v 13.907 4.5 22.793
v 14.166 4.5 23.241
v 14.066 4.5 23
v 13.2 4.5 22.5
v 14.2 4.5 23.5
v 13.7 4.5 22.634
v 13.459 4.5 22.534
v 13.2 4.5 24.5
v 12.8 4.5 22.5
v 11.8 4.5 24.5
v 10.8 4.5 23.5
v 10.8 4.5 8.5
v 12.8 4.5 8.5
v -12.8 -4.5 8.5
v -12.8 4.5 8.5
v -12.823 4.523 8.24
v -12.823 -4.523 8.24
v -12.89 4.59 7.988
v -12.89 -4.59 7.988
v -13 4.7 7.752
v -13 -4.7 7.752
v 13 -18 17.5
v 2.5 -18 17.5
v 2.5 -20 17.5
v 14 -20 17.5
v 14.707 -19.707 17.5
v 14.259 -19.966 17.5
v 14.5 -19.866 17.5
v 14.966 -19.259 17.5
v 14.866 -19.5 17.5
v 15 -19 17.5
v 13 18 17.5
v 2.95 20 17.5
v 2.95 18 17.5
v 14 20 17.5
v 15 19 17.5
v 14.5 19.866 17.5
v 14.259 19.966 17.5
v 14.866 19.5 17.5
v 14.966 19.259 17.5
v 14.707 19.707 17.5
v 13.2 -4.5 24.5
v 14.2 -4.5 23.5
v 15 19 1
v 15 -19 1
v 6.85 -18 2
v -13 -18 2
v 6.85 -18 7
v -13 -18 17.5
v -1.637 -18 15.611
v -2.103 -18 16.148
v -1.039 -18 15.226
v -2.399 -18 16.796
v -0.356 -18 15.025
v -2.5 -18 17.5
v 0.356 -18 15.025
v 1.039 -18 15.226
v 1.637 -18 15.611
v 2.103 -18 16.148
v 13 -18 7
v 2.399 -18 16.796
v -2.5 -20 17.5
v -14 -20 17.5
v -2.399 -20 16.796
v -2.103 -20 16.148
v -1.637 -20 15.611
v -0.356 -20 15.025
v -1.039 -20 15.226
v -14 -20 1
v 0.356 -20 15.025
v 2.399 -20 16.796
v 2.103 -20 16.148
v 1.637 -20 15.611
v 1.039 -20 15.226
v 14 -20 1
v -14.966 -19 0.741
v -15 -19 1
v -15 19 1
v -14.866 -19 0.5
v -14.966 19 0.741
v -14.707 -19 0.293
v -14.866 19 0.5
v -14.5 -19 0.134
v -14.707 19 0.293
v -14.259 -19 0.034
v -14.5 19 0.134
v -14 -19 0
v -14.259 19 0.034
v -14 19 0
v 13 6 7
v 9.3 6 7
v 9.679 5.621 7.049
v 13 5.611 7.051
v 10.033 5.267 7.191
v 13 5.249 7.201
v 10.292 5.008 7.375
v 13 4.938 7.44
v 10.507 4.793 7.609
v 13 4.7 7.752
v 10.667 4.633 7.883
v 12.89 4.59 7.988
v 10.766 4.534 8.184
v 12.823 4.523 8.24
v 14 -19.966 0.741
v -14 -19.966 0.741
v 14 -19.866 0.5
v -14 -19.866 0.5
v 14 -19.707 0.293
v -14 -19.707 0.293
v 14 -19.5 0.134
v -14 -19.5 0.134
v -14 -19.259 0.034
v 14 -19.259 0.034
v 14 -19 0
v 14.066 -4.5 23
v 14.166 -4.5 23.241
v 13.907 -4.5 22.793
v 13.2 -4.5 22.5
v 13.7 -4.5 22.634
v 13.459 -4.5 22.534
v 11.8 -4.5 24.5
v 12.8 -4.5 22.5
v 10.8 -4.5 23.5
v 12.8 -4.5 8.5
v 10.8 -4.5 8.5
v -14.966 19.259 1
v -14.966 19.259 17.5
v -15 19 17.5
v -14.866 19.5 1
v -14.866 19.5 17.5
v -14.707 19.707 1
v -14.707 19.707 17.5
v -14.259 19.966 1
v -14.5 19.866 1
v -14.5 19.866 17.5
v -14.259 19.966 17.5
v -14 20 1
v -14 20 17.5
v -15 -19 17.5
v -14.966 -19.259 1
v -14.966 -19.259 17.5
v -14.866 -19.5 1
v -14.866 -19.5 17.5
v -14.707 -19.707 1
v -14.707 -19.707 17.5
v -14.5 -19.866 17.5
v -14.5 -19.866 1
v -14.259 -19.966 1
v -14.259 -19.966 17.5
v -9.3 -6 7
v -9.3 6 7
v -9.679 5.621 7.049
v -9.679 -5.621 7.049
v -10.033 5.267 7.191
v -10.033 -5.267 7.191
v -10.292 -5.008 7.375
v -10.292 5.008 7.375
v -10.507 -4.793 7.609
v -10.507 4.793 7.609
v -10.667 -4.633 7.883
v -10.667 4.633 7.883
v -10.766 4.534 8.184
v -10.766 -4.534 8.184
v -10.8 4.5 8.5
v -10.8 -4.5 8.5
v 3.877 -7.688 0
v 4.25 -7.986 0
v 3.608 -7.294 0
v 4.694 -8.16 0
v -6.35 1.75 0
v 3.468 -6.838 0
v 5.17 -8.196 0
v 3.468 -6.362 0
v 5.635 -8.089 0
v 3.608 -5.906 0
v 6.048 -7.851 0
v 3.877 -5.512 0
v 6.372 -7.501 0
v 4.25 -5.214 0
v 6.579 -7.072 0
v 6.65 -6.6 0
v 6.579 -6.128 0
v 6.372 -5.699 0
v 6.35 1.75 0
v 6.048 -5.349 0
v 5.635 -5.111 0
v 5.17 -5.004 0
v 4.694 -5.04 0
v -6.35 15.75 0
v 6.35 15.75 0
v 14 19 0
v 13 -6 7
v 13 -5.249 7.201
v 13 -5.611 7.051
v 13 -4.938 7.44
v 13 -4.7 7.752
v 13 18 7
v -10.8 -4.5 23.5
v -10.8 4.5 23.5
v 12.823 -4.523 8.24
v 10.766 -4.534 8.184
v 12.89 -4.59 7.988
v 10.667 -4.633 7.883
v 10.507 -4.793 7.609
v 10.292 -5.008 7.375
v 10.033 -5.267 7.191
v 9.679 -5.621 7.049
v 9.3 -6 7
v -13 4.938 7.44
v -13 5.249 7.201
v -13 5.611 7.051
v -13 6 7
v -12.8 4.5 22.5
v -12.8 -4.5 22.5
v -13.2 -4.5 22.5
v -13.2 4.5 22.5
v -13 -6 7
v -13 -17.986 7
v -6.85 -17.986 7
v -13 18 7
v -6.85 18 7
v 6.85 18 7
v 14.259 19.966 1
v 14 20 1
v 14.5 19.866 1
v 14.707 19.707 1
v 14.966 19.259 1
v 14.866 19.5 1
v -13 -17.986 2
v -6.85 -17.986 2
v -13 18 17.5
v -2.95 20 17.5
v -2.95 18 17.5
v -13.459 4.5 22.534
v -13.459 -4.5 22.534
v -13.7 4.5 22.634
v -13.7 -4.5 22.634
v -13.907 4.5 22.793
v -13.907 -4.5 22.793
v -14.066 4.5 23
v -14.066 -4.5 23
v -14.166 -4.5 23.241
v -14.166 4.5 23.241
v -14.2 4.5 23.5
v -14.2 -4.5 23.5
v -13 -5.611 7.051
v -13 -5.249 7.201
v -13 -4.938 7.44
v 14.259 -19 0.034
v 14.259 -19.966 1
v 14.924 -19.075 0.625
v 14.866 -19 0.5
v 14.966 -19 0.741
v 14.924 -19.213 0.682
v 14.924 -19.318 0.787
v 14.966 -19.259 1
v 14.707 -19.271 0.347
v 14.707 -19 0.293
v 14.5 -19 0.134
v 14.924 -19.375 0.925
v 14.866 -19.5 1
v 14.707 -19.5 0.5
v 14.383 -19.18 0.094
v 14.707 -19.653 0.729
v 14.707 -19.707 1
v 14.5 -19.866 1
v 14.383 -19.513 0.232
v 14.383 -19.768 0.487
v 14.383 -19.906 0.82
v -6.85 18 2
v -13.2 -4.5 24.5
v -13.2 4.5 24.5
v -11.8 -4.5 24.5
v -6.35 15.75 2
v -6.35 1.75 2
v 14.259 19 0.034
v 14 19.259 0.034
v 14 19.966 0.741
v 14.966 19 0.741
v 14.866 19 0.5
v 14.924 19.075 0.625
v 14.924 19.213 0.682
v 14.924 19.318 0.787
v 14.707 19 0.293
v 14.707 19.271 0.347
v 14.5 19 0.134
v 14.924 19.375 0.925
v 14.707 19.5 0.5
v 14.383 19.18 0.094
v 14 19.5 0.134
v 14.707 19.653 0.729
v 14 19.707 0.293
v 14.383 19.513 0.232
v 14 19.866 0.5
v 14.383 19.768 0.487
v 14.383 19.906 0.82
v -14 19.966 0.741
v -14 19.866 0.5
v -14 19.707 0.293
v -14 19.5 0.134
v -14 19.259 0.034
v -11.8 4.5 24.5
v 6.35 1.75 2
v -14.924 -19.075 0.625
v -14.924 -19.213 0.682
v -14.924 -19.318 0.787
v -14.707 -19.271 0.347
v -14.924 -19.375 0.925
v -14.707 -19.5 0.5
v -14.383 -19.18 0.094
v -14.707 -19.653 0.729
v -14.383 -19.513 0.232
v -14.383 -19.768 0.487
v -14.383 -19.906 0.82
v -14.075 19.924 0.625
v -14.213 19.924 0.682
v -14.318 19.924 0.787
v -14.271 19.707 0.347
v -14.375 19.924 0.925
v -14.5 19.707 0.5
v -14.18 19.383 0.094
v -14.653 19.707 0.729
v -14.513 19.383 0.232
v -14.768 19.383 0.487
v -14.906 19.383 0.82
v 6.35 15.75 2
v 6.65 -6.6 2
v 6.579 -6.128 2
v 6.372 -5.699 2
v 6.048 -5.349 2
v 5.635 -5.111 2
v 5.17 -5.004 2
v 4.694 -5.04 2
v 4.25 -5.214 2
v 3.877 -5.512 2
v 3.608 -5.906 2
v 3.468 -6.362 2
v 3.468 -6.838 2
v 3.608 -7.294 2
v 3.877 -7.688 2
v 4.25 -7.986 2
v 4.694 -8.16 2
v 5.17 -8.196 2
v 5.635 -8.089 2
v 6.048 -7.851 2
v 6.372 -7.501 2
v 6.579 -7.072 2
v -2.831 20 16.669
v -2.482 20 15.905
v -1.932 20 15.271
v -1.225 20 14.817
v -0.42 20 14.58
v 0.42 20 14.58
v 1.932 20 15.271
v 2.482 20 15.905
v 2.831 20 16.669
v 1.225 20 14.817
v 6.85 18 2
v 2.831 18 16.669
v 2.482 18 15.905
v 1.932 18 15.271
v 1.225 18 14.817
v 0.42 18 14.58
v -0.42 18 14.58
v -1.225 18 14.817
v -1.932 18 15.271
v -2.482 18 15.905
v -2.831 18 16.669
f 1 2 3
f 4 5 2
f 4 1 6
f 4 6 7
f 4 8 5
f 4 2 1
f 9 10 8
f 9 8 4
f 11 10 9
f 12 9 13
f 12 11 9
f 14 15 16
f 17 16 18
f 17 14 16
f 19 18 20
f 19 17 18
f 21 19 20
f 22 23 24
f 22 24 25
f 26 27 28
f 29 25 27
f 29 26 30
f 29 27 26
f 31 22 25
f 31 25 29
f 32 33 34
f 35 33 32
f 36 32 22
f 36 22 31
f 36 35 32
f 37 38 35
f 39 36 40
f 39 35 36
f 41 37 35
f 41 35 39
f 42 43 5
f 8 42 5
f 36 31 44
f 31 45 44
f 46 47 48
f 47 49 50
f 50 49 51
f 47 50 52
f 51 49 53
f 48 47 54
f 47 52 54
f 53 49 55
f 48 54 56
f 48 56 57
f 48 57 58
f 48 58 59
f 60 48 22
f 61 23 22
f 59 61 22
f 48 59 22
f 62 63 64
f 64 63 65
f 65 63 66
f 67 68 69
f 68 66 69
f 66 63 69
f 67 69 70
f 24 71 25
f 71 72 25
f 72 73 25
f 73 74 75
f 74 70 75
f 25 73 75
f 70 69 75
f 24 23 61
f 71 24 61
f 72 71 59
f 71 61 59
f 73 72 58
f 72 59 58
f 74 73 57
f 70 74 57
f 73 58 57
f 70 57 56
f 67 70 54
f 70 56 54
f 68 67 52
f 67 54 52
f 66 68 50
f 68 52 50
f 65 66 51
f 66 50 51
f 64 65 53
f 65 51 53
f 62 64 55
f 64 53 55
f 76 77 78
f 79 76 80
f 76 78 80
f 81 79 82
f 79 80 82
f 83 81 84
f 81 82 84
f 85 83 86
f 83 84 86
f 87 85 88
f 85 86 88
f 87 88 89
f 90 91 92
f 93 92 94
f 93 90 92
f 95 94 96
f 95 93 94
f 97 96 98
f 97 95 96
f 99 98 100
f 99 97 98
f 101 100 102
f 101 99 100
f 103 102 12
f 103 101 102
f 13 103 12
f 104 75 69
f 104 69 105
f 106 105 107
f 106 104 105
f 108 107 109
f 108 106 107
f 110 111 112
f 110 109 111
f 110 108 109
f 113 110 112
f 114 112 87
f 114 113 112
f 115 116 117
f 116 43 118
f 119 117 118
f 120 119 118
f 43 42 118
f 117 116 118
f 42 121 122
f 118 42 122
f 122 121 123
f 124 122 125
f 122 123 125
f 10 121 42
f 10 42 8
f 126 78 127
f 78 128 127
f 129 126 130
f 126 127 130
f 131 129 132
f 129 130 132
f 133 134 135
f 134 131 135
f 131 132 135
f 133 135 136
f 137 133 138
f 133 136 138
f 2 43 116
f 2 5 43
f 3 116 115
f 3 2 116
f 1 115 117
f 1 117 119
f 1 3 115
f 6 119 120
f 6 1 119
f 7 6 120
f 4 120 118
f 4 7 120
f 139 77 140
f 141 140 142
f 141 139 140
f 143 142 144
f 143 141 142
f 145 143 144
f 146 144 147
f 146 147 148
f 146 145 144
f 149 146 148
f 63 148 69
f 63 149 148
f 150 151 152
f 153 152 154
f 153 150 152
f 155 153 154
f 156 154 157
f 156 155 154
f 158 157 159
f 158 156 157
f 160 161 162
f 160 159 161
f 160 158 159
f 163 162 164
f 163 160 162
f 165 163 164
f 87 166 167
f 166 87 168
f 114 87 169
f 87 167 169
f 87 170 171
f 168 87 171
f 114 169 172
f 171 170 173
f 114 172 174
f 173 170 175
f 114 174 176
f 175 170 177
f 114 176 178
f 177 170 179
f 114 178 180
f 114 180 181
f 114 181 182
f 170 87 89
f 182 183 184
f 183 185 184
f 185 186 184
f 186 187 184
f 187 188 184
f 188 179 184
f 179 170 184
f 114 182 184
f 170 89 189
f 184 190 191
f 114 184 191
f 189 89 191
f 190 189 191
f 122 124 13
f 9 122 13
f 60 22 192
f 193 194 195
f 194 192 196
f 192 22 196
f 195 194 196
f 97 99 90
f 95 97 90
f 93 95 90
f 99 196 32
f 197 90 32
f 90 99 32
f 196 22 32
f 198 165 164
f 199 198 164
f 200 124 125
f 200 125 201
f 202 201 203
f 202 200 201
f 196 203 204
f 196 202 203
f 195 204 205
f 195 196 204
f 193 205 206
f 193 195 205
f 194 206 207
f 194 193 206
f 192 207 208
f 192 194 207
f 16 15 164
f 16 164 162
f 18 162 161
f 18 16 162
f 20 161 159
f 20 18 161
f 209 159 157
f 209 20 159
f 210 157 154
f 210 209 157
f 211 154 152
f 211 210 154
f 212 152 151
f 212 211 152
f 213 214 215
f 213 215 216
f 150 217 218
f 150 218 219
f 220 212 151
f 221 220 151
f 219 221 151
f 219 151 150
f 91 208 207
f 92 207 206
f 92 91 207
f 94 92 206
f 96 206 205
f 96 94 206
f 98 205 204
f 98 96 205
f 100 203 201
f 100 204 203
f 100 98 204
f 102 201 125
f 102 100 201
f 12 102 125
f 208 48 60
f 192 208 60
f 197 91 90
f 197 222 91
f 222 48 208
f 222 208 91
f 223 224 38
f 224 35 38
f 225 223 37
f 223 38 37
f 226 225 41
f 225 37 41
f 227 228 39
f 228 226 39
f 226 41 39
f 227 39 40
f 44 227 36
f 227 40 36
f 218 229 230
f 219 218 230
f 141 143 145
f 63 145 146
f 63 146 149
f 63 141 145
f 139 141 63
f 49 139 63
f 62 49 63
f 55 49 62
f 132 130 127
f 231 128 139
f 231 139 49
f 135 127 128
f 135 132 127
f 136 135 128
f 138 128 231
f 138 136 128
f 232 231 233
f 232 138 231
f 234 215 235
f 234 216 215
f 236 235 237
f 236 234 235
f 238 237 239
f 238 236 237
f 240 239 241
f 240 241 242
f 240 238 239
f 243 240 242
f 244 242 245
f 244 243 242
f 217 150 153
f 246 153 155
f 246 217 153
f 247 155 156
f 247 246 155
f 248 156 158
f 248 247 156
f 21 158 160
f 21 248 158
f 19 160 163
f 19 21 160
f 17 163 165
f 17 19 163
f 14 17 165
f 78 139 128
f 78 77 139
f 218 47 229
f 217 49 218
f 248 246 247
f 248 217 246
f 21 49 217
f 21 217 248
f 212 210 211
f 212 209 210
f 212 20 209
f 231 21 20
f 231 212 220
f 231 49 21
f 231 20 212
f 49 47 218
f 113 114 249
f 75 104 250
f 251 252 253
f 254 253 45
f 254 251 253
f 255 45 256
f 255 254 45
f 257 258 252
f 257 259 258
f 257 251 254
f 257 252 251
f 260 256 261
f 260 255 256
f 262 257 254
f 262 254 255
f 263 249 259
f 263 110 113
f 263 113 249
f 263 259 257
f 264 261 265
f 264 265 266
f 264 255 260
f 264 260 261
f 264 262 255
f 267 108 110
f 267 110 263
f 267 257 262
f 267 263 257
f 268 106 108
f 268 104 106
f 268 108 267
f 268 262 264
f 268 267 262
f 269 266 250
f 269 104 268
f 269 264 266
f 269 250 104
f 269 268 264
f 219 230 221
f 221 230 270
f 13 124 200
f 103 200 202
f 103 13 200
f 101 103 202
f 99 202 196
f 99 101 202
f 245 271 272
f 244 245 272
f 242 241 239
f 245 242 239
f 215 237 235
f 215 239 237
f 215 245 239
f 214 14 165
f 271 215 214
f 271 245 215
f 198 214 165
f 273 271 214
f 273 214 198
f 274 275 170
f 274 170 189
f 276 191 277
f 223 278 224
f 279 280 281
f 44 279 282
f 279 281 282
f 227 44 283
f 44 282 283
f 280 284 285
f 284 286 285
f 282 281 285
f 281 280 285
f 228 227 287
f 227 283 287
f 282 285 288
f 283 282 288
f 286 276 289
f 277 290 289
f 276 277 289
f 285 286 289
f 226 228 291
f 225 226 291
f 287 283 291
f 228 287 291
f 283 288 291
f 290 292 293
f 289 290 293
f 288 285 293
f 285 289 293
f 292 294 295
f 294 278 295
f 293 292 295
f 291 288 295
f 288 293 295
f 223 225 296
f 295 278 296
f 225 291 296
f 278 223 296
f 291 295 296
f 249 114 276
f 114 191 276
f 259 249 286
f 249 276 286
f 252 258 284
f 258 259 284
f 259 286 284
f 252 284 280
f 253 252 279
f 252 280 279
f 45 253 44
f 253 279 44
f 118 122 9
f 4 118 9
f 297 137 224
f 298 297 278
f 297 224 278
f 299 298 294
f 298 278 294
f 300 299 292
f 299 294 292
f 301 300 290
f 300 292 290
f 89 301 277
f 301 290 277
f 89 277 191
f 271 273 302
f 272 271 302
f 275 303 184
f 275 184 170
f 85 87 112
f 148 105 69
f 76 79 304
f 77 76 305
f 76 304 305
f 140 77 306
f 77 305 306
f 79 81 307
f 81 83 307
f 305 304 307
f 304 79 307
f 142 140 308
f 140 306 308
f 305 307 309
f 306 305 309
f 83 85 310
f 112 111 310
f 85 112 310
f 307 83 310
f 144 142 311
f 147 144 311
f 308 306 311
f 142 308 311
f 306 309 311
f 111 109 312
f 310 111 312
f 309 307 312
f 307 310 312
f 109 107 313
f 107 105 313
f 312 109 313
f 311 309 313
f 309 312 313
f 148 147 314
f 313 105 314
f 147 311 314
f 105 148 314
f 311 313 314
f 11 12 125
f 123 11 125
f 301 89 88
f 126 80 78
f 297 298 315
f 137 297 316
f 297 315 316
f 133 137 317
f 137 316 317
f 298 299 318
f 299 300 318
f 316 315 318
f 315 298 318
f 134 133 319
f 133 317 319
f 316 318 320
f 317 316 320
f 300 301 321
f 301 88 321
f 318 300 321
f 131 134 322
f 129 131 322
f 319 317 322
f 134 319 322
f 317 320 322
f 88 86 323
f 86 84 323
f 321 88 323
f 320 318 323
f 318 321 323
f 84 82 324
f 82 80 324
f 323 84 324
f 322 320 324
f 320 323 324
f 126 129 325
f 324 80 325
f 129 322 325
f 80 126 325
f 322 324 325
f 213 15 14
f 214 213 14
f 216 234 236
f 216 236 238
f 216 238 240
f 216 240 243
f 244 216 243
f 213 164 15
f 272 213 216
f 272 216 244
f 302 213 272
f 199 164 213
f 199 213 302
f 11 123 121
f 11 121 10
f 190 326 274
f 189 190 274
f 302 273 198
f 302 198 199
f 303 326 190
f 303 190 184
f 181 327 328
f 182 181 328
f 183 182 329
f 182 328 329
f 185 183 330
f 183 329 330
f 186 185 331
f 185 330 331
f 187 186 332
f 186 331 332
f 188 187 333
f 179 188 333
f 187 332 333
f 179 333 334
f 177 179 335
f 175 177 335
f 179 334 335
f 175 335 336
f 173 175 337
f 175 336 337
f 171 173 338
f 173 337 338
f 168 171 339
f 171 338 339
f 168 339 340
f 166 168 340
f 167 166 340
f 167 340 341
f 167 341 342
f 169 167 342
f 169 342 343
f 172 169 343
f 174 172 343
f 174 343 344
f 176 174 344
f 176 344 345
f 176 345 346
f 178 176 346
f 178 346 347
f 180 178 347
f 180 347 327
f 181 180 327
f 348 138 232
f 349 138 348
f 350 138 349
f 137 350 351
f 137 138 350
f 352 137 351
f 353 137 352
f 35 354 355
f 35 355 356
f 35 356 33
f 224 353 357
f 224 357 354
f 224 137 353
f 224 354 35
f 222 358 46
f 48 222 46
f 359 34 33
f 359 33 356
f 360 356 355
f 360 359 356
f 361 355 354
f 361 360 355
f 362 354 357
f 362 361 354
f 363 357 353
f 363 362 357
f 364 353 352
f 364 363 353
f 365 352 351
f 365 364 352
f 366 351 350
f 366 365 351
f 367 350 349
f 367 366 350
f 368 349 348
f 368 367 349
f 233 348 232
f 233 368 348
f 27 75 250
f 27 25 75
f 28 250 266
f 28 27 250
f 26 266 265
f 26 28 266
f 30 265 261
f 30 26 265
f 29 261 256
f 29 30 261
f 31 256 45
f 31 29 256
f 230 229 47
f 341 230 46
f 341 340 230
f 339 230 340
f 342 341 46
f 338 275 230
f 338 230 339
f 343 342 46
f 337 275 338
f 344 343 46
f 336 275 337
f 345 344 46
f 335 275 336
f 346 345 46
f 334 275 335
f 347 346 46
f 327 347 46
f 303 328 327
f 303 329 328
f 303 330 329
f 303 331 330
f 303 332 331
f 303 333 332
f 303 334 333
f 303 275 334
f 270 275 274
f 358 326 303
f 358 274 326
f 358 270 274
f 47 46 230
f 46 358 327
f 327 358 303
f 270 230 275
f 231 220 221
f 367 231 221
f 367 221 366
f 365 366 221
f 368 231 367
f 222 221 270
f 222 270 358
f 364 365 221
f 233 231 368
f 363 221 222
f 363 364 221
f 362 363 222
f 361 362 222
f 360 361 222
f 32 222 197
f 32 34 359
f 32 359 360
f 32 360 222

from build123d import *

# Parameters (mm, degrees)
SKETCH1_W           = 30
SKETCH1_H           = 40
BOSS_EXTRUDE1_DEPTH = 17.5
SKETCH2_W           = 26
SKETCH2_H           = 36
CUT_EXTRUDE1_DEPTH  = 15.5
SKETCH3_R           = 1.6
CUT_EXTRUDE2_DEPTH  = 30.41513216
BOSS_EXTRUDE2_DEPTH = 5
CUT_EXTRUDE3_DEPTH  = 45.443784717
CUT_EXTRUDE4_DEPTH  = 45.443784717
BOSS_EXTRUDE3_START = 0.2
SKETCH6_W           = 7
SKETCH6_H           = 9
SKETCH6_W_2         = 10.5
BOSS_EXTRUDE3_DEPTH = 2
FILLET2_R           = 1
BOSS_EXTRUDE7_START = 0.2
SKETCH7_W           = 17.5
SKETCH7_H           = 9
BOSS_EXTRUDE7_DEPTH = 2
SKETCH8_W           = 2
SKETCH8_H           = 9
BOSS_EXTRUDE8_DEPTH = 1.4
FILLET6_R           = 1.5
SKETCH9_W           = 2
SKETCH9_H           = 9
BOSS_EXTRUDE9_DEPTH = 1.4
CHAMFER1_SIZE       = 1
FILLET7_R           = 1


# Some blends are built 0.0001 mm under size
with BuildPart() as part:
    # Sketch1 → Boss-Extrude1 (new body)
    with BuildSketch(Plane.XY):
        Rectangle(SKETCH1_W, SKETCH1_H)
    extrude(amount=BOSS_EXTRUDE1_DEPTH)

    # Sketch2 → Cut-Extrude1 (cut)
    with BuildSketch(Plane.XY.offset(17.5)):
        Rectangle(SKETCH2_W, SKETCH2_H)
    extrude(amount=-CUT_EXTRUDE1_DEPTH, mode=Mode.SUBTRACT)

    # Sketch3 → Cut-Extrude2 (cut, through all)
    with BuildSketch(Plane.XY.offset(2)):
        Polygon((6.35, 1.75), (-6.35, 1.75), (-6.35, 15.75), (0, 15.75), (6.35, 15.75), align=None)
        with Locations((5.05, -6.6)):
            Circle(SKETCH3_R)
    extrude(amount=-CUT_EXTRUDE2_DEPTH, mode=Mode.SUBTRACT)

    # Sketch3<3> → Boss-Extrude2 (add)
    with BuildSketch(Plane.XY.offset(2)):
        Polygon((-6.85, -14), (-6.85, 18), (-13, 18), (-13, -17.985559901), (-6.85, -17.985559901), align=None)
        Polygon((13, 18), (6.85, 18), (6.85, -14), (6.85, -18), (13, -18), align=None)
    extrude(amount=BOSS_EXTRUDE2_DEPTH)

    # Sketch4 → Cut-Extrude3 (cut, through all)
    with BuildSketch(Plane.XZ.offset(-18)):
        with BuildLine():
            Line((-2.95, 17.5), (2.95, 17.5))
            ThreePointArc((2.95, 17.5), (0, 14.55), (-2.95, 17.5))
        make_face()
    extrude(amount=-CUT_EXTRUDE3_DEPTH, mode=Mode.SUBTRACT)

    # Sketch5 → Cut-Extrude4 (cut, through all)
    with BuildSketch(Plane(origin=(0, -18, 0), x_dir=(1, 0, 0), z_dir=(0, 1, 0))):
        with BuildLine():
            Line((-2.5, -17.5), (2.5, -17.5))
            ThreePointArc((2.5, -17.5), (0, -15), (-2.5, -17.5))
        make_face()
    extrude(amount=-CUT_EXTRUDE4_DEPTH, mode=Mode.SUBTRACT)

    # Sketch6 → Boss-Extrude3 (add)
    with BuildSketch(Plane.ZY.offset(-13).offset(BOSS_EXTRUDE3_START)):
        with Locations((21, 0)):
            Rectangle(SKETCH6_W, SKETCH6_H)
        with Locations((12.25, 0)):
            Rectangle(SKETCH6_W_2, SKETCH6_H)
    extrude(amount=BOSS_EXTRUDE3_DEPTH)

    # Fillet2
    fillet2_edges = [part.edges().sort_by_distance(p)[0] for p in [
        (0, -20, 0),
        (-15, 0, 0),
        (0, 20, 0),
        (15, 0, 0),
        (15, -20, 8.75),
        (-15, -20, 8.75),
        (-15, 20, 8.75),
        (15, 20, 8.75),
    ]]
    fillet(fillet2_edges, radius=FILLET2_R)

    # Sketch7 → Boss-Extrude7 (add)
    with BuildSketch(Plane(origin=(-13, 0, 0), x_dir=(0, 0, -1), z_dir=(1, 0, 0)).offset(BOSS_EXTRUDE7_START)):
        with Locations((-15.75, 0)):
            Rectangle(SKETCH7_W, SKETCH7_H)
    extrude(amount=BOSS_EXTRUDE7_DEPTH)

    # Sketch8 → Boss-Extrude8 (add)
    with BuildSketch(Plane.ZY.offset(12.8)):
        with Locations((23.5, 0)):
            Rectangle(SKETCH8_W, SKETCH8_H)
    extrude(amount=BOSS_EXTRUDE8_DEPTH)

    # Fillet6
    # the kernel refuses this fillet: 1.5 mm, written as the material it adds along each edge
    with BuildSketch(Plane(origin=(12.8, -4.5, 7), x_dir=(0, -1, 0), z_dir=(-1, 0, 0)), Plane(origin=(-12.8, 4.5, 7), x_dir=(0, 1, 0), z_dir=(1, 0, 0))) as fillet6_piece_1:
        with BuildLine():
            CenterArc((FILLET6_R, FILLET6_R), FILLET6_R, 180, 90)
            Line((0, FILLET6_R), (-FILLET6_R * 0.02, FILLET6_R))
            Line((-FILLET6_R * 0.02, FILLET6_R), (-FILLET6_R * 0.02, -FILLET6_R * 0.02))
            Line((-FILLET6_R * 0.02, -FILLET6_R * 0.02), (FILLET6_R, -FILLET6_R * 0.02))
            Line((FILLET6_R, -FILLET6_R * 0.02), (FILLET6_R, 0))
        make_face()
    extrude(amount=2)
    with BuildSketch(Plane(origin=(12.8, 4.5, 7), x_dir=(1, 0, 0), z_dir=(0, -1, 0)), Plane(origin=(-12.8, -4.5, 7), x_dir=(-1, 0, 0), z_dir=(0, 1, 0))) as fillet6_piece_2:
        with BuildLine():
            CenterArc((FILLET6_R, FILLET6_R), FILLET6_R, 180, 90)
            Line((0, FILLET6_R), (-FILLET6_R * 0.02, FILLET6_R))
            Line((-FILLET6_R * 0.02, FILLET6_R), (-FILLET6_R * 0.02, -FILLET6_R * 0.02))
            Line((-FILLET6_R * 0.02, -FILLET6_R * 0.02), (FILLET6_R, -FILLET6_R * 0.02))
            Line((FILLET6_R, -FILLET6_R * 0.02), (FILLET6_R, 0))
        make_face()
    extrude(amount=9)
    with BuildSketch(Plane(origin=(12.8, 4.5, 7), x_dir=(0, 1, 0), z_dir=(-1, 0, 0)), Plane(origin=(-12.8, -4.5, 7), x_dir=(0, -1, 0), z_dir=(1, 0, 0))) as fillet6_piece_3:
        with BuildLine():
            CenterArc((FILLET6_R, -FILLET6_R), FILLET6_R, 90, 90)
            Line((0, -FILLET6_R), (-FILLET6_R * 0.02, -FILLET6_R))
            Line((-FILLET6_R * 0.02, -FILLET6_R), (-FILLET6_R * 0.02, FILLET6_R * 0.02))
            Line((-FILLET6_R * 0.02, FILLET6_R * 0.02), (FILLET6_R, FILLET6_R * 0.02))
            Line((FILLET6_R, FILLET6_R * 0.02), (FILLET6_R, 0))
        make_face()
    extrude(amount=2)
    with BuildSketch(Plane(origin=(10.8, 4.5, 7), x_dir=(-1, 0, 0), z_dir=(0, -1, 0)), Plane(origin=(-10.8, -4.5, 7), x_dir=(1, 0, 0), z_dir=(0, 1, 0))) as fillet6_piece_4:
        with BuildLine():
            CenterArc((FILLET6_R, -FILLET6_R), FILLET6_R, 90, 90)
            Line((0, -FILLET6_R), (-FILLET6_R * 0.02, -FILLET6_R))
            Line((-FILLET6_R * 0.02, -FILLET6_R), (-FILLET6_R * 0.02, FILLET6_R * 0.02))
            Line((-FILLET6_R * 0.02, FILLET6_R * 0.02), (FILLET6_R, FILLET6_R * 0.02))
            Line((FILLET6_R, FILLET6_R * 0.02), (FILLET6_R, 0))
        make_face()
    extrude(amount=9)
    with BuildSketch(Plane(origin=(12.8, 4.5, 7), x_dir=(1, 0, 0), z_dir=(0, -1, 0))) as fillet6_piece_5a_section:
        with BuildLine():
            CenterArc((FILLET6_R, FILLET6_R), FILLET6_R, 180, 90)
            Line((0, FILLET6_R), (-FILLET6_R * 0.02, FILLET6_R))
            Line((-FILLET6_R * 0.02, FILLET6_R), (-FILLET6_R * 0.02, -FILLET6_R * 0.02))
            Line((-FILLET6_R * 0.02, -FILLET6_R * 0.02), (FILLET6_R, -FILLET6_R * 0.02))
            Line((FILLET6_R, -FILLET6_R * 0.02), (FILLET6_R, 0))
        make_face()
    fillet6_piece_5a = extrude(amount=12.75, mode=Mode.PRIVATE)
    fillet6_piece_5a = split(fillet6_piece_5a, bisect_by=Plane(origin=(13.139592671, -4.5, 7.339592671), z_dir=(0, -1, 0)), keep=Keep.TOP, mode=Mode.PRIVATE)
    with BuildSketch(Plane(origin=(16.55, -4.5, 7), x_dir=(0, -1, 0), z_dir=(-1, 0, 0))) as fillet6_piece_5b_section:
        with BuildLine():
            CenterArc((FILLET6_R, FILLET6_R), FILLET6_R, 180, 90)
            Line((0, FILLET6_R), (-FILLET6_R * 0.02, FILLET6_R))
            Line((-FILLET6_R * 0.02, FILLET6_R), (-FILLET6_R * 0.02, -FILLET6_R * 0.02))
            Line((-FILLET6_R * 0.02, -FILLET6_R * 0.02), (FILLET6_R, -FILLET6_R * 0.02))
            Line((FILLET6_R, -FILLET6_R * 0.02), (FILLET6_R, 0))
        make_face()
    fillet6_piece_5b = extrude(amount=5.75, mode=Mode.PRIVATE)
    fillet6_piece_5b = split(fillet6_piece_5b, bisect_by=Plane(origin=(12.8, -4.839592671, 7.339592671), z_dir=(1, 0, 0)), keep=Keep.TOP, mode=Mode.PRIVATE)
    fillet6_piece_5 = fillet6_piece_5a & fillet6_piece_5b
    add(fillet6_piece_5)
    with BuildSketch(Plane(origin=(10.8, 4.5, 7), x_dir=(-1, 0, 0), z_dir=(0, -1, 0))) as fillet6_piece_6a_section:
        with BuildLine():
            CenterArc((FILLET6_R, -FILLET6_R), FILLET6_R, 90, 90)
            Line((0, -FILLET6_R), (-FILLET6_R * 0.02, -FILLET6_R))
            Line((-FILLET6_R * 0.02, -FILLET6_R), (-FILLET6_R * 0.02, FILLET6_R * 0.02))
            Line((-FILLET6_R * 0.02, FILLET6_R * 0.02), (FILLET6_R, FILLET6_R * 0.02))
            Line((FILLET6_R, FILLET6_R * 0.02), (FILLET6_R, 0))
        make_face()
    fillet6_piece_6a = extrude(amount=12.75, mode=Mode.PRIVATE)
    fillet6_piece_6a = split(fillet6_piece_6a, bisect_by=Plane(origin=(10.460407329, -4.5, 7.339592671), z_dir=(0, -1, 0)), keep=Keep.TOP, mode=Mode.PRIVATE)
    with BuildSketch(Plane(origin=(12.8, -4.5, 7), x_dir=(0, -1, 0), z_dir=(-1, 0, 0))) as fillet6_piece_6b_section:
        with BuildLine():
            CenterArc((FILLET6_R, FILLET6_R), FILLET6_R, 180, 90)
            Line((0, FILLET6_R), (-FILLET6_R * 0.02, FILLET6_R))
            Line((-FILLET6_R * 0.02, FILLET6_R), (-FILLET6_R * 0.02, -FILLET6_R * 0.02))
            Line((-FILLET6_R * 0.02, -FILLET6_R * 0.02), (FILLET6_R, -FILLET6_R * 0.02))
            Line((FILLET6_R, -FILLET6_R * 0.02), (FILLET6_R, 0))
        make_face()
    fillet6_piece_6b = extrude(amount=5.75, mode=Mode.PRIVATE)
    fillet6_piece_6b = split(fillet6_piece_6b, bisect_by=Plane(origin=(10.8, -4.839592671, 7.339592671), z_dir=(-1, 0, 0)), keep=Keep.TOP, mode=Mode.PRIVATE)
    fillet6_piece_6 = fillet6_piece_6a & fillet6_piece_6b
    add(fillet6_piece_6)
    with BuildSketch(Plane(origin=(12.8, 8.25, 7), x_dir=(1, 0, 0), z_dir=(0, -1, 0))) as fillet6_piece_7a_section:
        with BuildLine():
            CenterArc((FILLET6_R, FILLET6_R), FILLET6_R, 180, 90)
            Line((0, FILLET6_R), (-FILLET6_R * 0.02, FILLET6_R))
            Line((-FILLET6_R * 0.02, FILLET6_R), (-FILLET6_R * 0.02, -FILLET6_R * 0.02))
            Line((-FILLET6_R * 0.02, -FILLET6_R * 0.02), (FILLET6_R, -FILLET6_R * 0.02))
            Line((FILLET6_R, -FILLET6_R * 0.02), (FILLET6_R, 0))
        make_face()
    fillet6_piece_7a = extrude(amount=12.75, mode=Mode.PRIVATE)
    fillet6_piece_7a = split(fillet6_piece_7a, bisect_by=Plane(origin=(13.139592671, 4.5, 7.339592671), z_dir=(0, 1, 0)), keep=Keep.TOP, mode=Mode.PRIVATE)
    with BuildSketch(Plane(origin=(16.55, 4.5, 7), x_dir=(0, 1, 0), z_dir=(-1, 0, 0))) as fillet6_piece_7b_section:
        with BuildLine():
            CenterArc((FILLET6_R, -FILLET6_R), FILLET6_R, 90, 90)
            Line((0, -FILLET6_R), (-FILLET6_R * 0.02, -FILLET6_R))
            Line((-FILLET6_R * 0.02, -FILLET6_R), (-FILLET6_R * 0.02, FILLET6_R * 0.02))
            Line((-FILLET6_R * 0.02, FILLET6_R * 0.02), (FILLET6_R, FILLET6_R * 0.02))
            Line((FILLET6_R, FILLET6_R * 0.02), (FILLET6_R, 0))
        make_face()
    fillet6_piece_7b = extrude(amount=5.75, mode=Mode.PRIVATE)
    fillet6_piece_7b = split(fillet6_piece_7b, bisect_by=Plane(origin=(12.8, 4.839592671, 7.339592671), z_dir=(1, 0, 0)), keep=Keep.TOP, mode=Mode.PRIVATE)
    fillet6_piece_7 = fillet6_piece_7a & fillet6_piece_7b
    add(fillet6_piece_7)
    with BuildSketch(Plane(origin=(12.8, 4.5, 7), x_dir=(0, 1, 0), z_dir=(-1, 0, 0))) as fillet6_piece_8a_section:
        with BuildLine():
            CenterArc((FILLET6_R, -FILLET6_R), FILLET6_R, 90, 90)
            Line((0, -FILLET6_R), (-FILLET6_R * 0.02, -FILLET6_R))
            Line((-FILLET6_R * 0.02, -FILLET6_R), (-FILLET6_R * 0.02, FILLET6_R * 0.02))
            Line((-FILLET6_R * 0.02, FILLET6_R * 0.02), (FILLET6_R, FILLET6_R * 0.02))
            Line((FILLET6_R, FILLET6_R * 0.02), (FILLET6_R, 0))
        make_face()
    fillet6_piece_8a = extrude(amount=5.75, mode=Mode.PRIVATE)
    fillet6_piece_8a = split(fillet6_piece_8a, bisect_by=Plane(origin=(10.8, 4.839592671, 7.339592671), z_dir=(-1, 0, 0)), keep=Keep.TOP, mode=Mode.PRIVATE)
    with BuildSketch(Plane(origin=(10.8, 8.25, 7), x_dir=(-1, 0, 0), z_dir=(0, -1, 0))) as fillet6_piece_8b_section:
        with BuildLine():
            CenterArc((FILLET6_R, -FILLET6_R), FILLET6_R, 90, 90)
            Line((0, -FILLET6_R), (-FILLET6_R * 0.02, -FILLET6_R))
            Line((-FILLET6_R * 0.02, -FILLET6_R), (-FILLET6_R * 0.02, FILLET6_R * 0.02))
            Line((-FILLET6_R * 0.02, FILLET6_R * 0.02), (FILLET6_R, FILLET6_R * 0.02))
            Line((FILLET6_R, FILLET6_R * 0.02), (FILLET6_R, 0))
        make_face()
    fillet6_piece_8b = extrude(amount=12.75, mode=Mode.PRIVATE)
    fillet6_piece_8b = split(fillet6_piece_8b, bisect_by=Plane(origin=(10.460407329, 4.5, 7.339592671), z_dir=(0, 1, 0)), keep=Keep.TOP, mode=Mode.PRIVATE)
    fillet6_piece_8 = fillet6_piece_8a & fillet6_piece_8b
    add(fillet6_piece_8)
    with BuildSketch(Plane(origin=(-16.55, 4.5, 7), x_dir=(0, 1, 0), z_dir=(1, 0, 0))) as fillet6_piece_9a_section:
        with BuildLine():
            CenterArc((FILLET6_R, FILLET6_R), FILLET6_R, 180, 90)
            Line((0, FILLET6_R), (-FILLET6_R * 0.02, FILLET6_R))
            Line((-FILLET6_R * 0.02, FILLET6_R), (-FILLET6_R * 0.02, -FILLET6_R * 0.02))
            Line((-FILLET6_R * 0.02, -FILLET6_R * 0.02), (FILLET6_R, -FILLET6_R * 0.02))
            Line((FILLET6_R, -FILLET6_R * 0.02), (FILLET6_R, 0))
        make_face()
    fillet6_piece_9a = extrude(amount=5.75, mode=Mode.PRIVATE)
    fillet6_piece_9a = split(fillet6_piece_9a, bisect_by=Plane(origin=(-12.8, 4.839592671, 7.339592671), z_dir=(-1, 0, 0)), keep=Keep.TOP, mode=Mode.PRIVATE)
    with BuildSketch(Plane(origin=(-12.8, -4.5, 7), x_dir=(-1, 0, 0), z_dir=(0, 1, 0))) as fillet6_piece_9b_section:
        with BuildLine():
            CenterArc((FILLET6_R, FILLET6_R), FILLET6_R, 180, 90)
            Line((0, FILLET6_R), (-FILLET6_R * 0.02, FILLET6_R))
            Line((-FILLET6_R * 0.02, FILLET6_R), (-FILLET6_R * 0.02, -FILLET6_R * 0.02))
            Line((-FILLET6_R * 0.02, -FILLET6_R * 0.02), (FILLET6_R, -FILLET6_R * 0.02))
            Line((FILLET6_R, -FILLET6_R * 0.02), (FILLET6_R, 0))
        make_face()
    fillet6_piece_9b = extrude(amount=12.75, mode=Mode.PRIVATE)
    fillet6_piece_9b = split(fillet6_piece_9b, bisect_by=Plane(origin=(-13.139592671, 4.5, 7.339592671), z_dir=(0, 1, 0)), keep=Keep.TOP, mode=Mode.PRIVATE)
    fillet6_piece_9 = fillet6_piece_9a & fillet6_piece_9b
    add(fillet6_piece_9)
    with BuildSketch(Plane(origin=(-10.8, -4.5, 7), x_dir=(1, 0, 0), z_dir=(0, 1, 0))) as fillet6_piece_10a_section:
        with BuildLine():
            CenterArc((FILLET6_R, -FILLET6_R), FILLET6_R, 90, 90)
            Line((0, -FILLET6_R), (-FILLET6_R * 0.02, -FILLET6_R))
            Line((-FILLET6_R * 0.02, -FILLET6_R), (-FILLET6_R * 0.02, FILLET6_R * 0.02))
            Line((-FILLET6_R * 0.02, FILLET6_R * 0.02), (FILLET6_R, FILLET6_R * 0.02))
            Line((FILLET6_R, FILLET6_R * 0.02), (FILLET6_R, 0))
        make_face()
    fillet6_piece_10a = extrude(amount=12.75, mode=Mode.PRIVATE)
    fillet6_piece_10a = split(fillet6_piece_10a, bisect_by=Plane(origin=(-10.460407329, 4.5, 7.339592671), z_dir=(0, 1, 0)), keep=Keep.TOP, mode=Mode.PRIVATE)
    with BuildSketch(Plane(origin=(-12.8, 4.5, 7), x_dir=(0, 1, 0), z_dir=(1, 0, 0))) as fillet6_piece_10b_section:
        with BuildLine():
            CenterArc((FILLET6_R, FILLET6_R), FILLET6_R, 180, 90)
            Line((0, FILLET6_R), (-FILLET6_R * 0.02, FILLET6_R))
            Line((-FILLET6_R * 0.02, FILLET6_R), (-FILLET6_R * 0.02, -FILLET6_R * 0.02))
            Line((-FILLET6_R * 0.02, -FILLET6_R * 0.02), (FILLET6_R, -FILLET6_R * 0.02))
            Line((FILLET6_R, -FILLET6_R * 0.02), (FILLET6_R, 0))
        make_face()
    fillet6_piece_10b = extrude(amount=5.75, mode=Mode.PRIVATE)
    fillet6_piece_10b = split(fillet6_piece_10b, bisect_by=Plane(origin=(-10.8, 4.839592671, 7.339592671), z_dir=(1, 0, 0)), keep=Keep.TOP, mode=Mode.PRIVATE)
    fillet6_piece_10 = fillet6_piece_10a & fillet6_piece_10b
    add(fillet6_piece_10)
    with BuildSketch(Plane(origin=(-16.55, -4.5, 7), x_dir=(0, -1, 0), z_dir=(1, 0, 0))) as fillet6_piece_11a_section:
        with BuildLine():
            CenterArc((FILLET6_R, -FILLET6_R), FILLET6_R, 90, 90)
            Line((0, -FILLET6_R), (-FILLET6_R * 0.02, -FILLET6_R))
            Line((-FILLET6_R * 0.02, -FILLET6_R), (-FILLET6_R * 0.02, FILLET6_R * 0.02))
            Line((-FILLET6_R * 0.02, FILLET6_R * 0.02), (FILLET6_R, FILLET6_R * 0.02))
            Line((FILLET6_R, FILLET6_R * 0.02), (FILLET6_R, 0))
        make_face()
    fillet6_piece_11a = extrude(amount=5.75, mode=Mode.PRIVATE)
    fillet6_piece_11a = split(fillet6_piece_11a, bisect_by=Plane(origin=(-12.8, -4.839592671, 7.339592671), z_dir=(-1, 0, 0)), keep=Keep.TOP, mode=Mode.PRIVATE)
    with BuildSketch(Plane(origin=(-12.8, -8.25, 7), x_dir=(-1, 0, 0), z_dir=(0, 1, 0))) as fillet6_piece_11b_section:
        with BuildLine():
            CenterArc((FILLET6_R, FILLET6_R), FILLET6_R, 180, 90)
            Line((0, FILLET6_R), (-FILLET6_R * 0.02, FILLET6_R))
            Line((-FILLET6_R * 0.02, FILLET6_R), (-FILLET6_R * 0.02, -FILLET6_R * 0.02))
            Line((-FILLET6_R * 0.02, -FILLET6_R * 0.02), (FILLET6_R, -FILLET6_R * 0.02))
            Line((FILLET6_R, -FILLET6_R * 0.02), (FILLET6_R, 0))
        make_face()
    fillet6_piece_11b = extrude(amount=12.75, mode=Mode.PRIVATE)
    fillet6_piece_11b = split(fillet6_piece_11b, bisect_by=Plane(origin=(-13.139592671, -4.5, 7.339592671), z_dir=(0, -1, 0)), keep=Keep.TOP, mode=Mode.PRIVATE)
    fillet6_piece_11 = fillet6_piece_11a & fillet6_piece_11b
    add(fillet6_piece_11)
    with BuildSketch(Plane(origin=(-12.8, -4.5, 7), x_dir=(0, -1, 0), z_dir=(1, 0, 0))) as fillet6_piece_12a_section:
        with BuildLine():
            CenterArc((FILLET6_R, -FILLET6_R), FILLET6_R, 90, 90)
            Line((0, -FILLET6_R), (-FILLET6_R * 0.02, -FILLET6_R))
            Line((-FILLET6_R * 0.02, -FILLET6_R), (-FILLET6_R * 0.02, FILLET6_R * 0.02))
            Line((-FILLET6_R * 0.02, FILLET6_R * 0.02), (FILLET6_R, FILLET6_R * 0.02))
            Line((FILLET6_R, FILLET6_R * 0.02), (FILLET6_R, 0))
        make_face()
    fillet6_piece_12a = extrude(amount=5.75, mode=Mode.PRIVATE)
    fillet6_piece_12a = split(fillet6_piece_12a, bisect_by=Plane(origin=(-10.8, -4.839592671, 7.339592671), z_dir=(1, 0, 0)), keep=Keep.TOP, mode=Mode.PRIVATE)
    with BuildSketch(Plane(origin=(-10.8, -8.25, 7), x_dir=(1, 0, 0), z_dir=(0, 1, 0))) as fillet6_piece_12b_section:
        with BuildLine():
            CenterArc((FILLET6_R, -FILLET6_R), FILLET6_R, 90, 90)
            Line((0, -FILLET6_R), (-FILLET6_R * 0.02, -FILLET6_R))
            Line((-FILLET6_R * 0.02, -FILLET6_R), (-FILLET6_R * 0.02, FILLET6_R * 0.02))
            Line((-FILLET6_R * 0.02, FILLET6_R * 0.02), (FILLET6_R, FILLET6_R * 0.02))
            Line((FILLET6_R, FILLET6_R * 0.02), (FILLET6_R, 0))
        make_face()
    fillet6_piece_12b = extrude(amount=12.75, mode=Mode.PRIVATE)
    fillet6_piece_12b = split(fillet6_piece_12b, bisect_by=Plane(origin=(-10.460407329, -4.5, 7.339592671), z_dir=(0, -1, 0)), keep=Keep.TOP, mode=Mode.PRIVATE)
    fillet6_piece_12 = fillet6_piece_12a & fillet6_piece_12b
    add(fillet6_piece_12)

    # Sketch9 → Boss-Extrude9 (add)
    with BuildSketch(Plane(origin=(12.8, 0, 0), x_dir=(0, 0, -1), z_dir=(1, 0, 0))):
        with Locations((-23.5, 0)):
            Rectangle(SKETCH9_W, SKETCH9_H)
    extrude(amount=BOSS_EXTRUDE9_DEPTH)

    # Chamfer1
    chamfer1_edges = [part.edges().sort_by_distance(p)[0] for p in [
        (10.8, 0, 24.5),
        (-10.8, 0, 24.5),
        (-14.2, 0, 24.5),
        (14.2, 0, 24.5),
    ]]
    chamfer(chamfer1_edges, length=CHAMFER1_SIZE)

    # Fillet7
    fillet7_edges = [part.edges().sort_by_distance(p)[0] for p in [
        (-14.2, 0, 22.5),
        (14.2, 0, 22.5),
    ]]
    fillet(fillet7_edges, radius=FILLET7_R - 0.0001)  # a hair under: the kernel refuses the full size


solid = part.part
